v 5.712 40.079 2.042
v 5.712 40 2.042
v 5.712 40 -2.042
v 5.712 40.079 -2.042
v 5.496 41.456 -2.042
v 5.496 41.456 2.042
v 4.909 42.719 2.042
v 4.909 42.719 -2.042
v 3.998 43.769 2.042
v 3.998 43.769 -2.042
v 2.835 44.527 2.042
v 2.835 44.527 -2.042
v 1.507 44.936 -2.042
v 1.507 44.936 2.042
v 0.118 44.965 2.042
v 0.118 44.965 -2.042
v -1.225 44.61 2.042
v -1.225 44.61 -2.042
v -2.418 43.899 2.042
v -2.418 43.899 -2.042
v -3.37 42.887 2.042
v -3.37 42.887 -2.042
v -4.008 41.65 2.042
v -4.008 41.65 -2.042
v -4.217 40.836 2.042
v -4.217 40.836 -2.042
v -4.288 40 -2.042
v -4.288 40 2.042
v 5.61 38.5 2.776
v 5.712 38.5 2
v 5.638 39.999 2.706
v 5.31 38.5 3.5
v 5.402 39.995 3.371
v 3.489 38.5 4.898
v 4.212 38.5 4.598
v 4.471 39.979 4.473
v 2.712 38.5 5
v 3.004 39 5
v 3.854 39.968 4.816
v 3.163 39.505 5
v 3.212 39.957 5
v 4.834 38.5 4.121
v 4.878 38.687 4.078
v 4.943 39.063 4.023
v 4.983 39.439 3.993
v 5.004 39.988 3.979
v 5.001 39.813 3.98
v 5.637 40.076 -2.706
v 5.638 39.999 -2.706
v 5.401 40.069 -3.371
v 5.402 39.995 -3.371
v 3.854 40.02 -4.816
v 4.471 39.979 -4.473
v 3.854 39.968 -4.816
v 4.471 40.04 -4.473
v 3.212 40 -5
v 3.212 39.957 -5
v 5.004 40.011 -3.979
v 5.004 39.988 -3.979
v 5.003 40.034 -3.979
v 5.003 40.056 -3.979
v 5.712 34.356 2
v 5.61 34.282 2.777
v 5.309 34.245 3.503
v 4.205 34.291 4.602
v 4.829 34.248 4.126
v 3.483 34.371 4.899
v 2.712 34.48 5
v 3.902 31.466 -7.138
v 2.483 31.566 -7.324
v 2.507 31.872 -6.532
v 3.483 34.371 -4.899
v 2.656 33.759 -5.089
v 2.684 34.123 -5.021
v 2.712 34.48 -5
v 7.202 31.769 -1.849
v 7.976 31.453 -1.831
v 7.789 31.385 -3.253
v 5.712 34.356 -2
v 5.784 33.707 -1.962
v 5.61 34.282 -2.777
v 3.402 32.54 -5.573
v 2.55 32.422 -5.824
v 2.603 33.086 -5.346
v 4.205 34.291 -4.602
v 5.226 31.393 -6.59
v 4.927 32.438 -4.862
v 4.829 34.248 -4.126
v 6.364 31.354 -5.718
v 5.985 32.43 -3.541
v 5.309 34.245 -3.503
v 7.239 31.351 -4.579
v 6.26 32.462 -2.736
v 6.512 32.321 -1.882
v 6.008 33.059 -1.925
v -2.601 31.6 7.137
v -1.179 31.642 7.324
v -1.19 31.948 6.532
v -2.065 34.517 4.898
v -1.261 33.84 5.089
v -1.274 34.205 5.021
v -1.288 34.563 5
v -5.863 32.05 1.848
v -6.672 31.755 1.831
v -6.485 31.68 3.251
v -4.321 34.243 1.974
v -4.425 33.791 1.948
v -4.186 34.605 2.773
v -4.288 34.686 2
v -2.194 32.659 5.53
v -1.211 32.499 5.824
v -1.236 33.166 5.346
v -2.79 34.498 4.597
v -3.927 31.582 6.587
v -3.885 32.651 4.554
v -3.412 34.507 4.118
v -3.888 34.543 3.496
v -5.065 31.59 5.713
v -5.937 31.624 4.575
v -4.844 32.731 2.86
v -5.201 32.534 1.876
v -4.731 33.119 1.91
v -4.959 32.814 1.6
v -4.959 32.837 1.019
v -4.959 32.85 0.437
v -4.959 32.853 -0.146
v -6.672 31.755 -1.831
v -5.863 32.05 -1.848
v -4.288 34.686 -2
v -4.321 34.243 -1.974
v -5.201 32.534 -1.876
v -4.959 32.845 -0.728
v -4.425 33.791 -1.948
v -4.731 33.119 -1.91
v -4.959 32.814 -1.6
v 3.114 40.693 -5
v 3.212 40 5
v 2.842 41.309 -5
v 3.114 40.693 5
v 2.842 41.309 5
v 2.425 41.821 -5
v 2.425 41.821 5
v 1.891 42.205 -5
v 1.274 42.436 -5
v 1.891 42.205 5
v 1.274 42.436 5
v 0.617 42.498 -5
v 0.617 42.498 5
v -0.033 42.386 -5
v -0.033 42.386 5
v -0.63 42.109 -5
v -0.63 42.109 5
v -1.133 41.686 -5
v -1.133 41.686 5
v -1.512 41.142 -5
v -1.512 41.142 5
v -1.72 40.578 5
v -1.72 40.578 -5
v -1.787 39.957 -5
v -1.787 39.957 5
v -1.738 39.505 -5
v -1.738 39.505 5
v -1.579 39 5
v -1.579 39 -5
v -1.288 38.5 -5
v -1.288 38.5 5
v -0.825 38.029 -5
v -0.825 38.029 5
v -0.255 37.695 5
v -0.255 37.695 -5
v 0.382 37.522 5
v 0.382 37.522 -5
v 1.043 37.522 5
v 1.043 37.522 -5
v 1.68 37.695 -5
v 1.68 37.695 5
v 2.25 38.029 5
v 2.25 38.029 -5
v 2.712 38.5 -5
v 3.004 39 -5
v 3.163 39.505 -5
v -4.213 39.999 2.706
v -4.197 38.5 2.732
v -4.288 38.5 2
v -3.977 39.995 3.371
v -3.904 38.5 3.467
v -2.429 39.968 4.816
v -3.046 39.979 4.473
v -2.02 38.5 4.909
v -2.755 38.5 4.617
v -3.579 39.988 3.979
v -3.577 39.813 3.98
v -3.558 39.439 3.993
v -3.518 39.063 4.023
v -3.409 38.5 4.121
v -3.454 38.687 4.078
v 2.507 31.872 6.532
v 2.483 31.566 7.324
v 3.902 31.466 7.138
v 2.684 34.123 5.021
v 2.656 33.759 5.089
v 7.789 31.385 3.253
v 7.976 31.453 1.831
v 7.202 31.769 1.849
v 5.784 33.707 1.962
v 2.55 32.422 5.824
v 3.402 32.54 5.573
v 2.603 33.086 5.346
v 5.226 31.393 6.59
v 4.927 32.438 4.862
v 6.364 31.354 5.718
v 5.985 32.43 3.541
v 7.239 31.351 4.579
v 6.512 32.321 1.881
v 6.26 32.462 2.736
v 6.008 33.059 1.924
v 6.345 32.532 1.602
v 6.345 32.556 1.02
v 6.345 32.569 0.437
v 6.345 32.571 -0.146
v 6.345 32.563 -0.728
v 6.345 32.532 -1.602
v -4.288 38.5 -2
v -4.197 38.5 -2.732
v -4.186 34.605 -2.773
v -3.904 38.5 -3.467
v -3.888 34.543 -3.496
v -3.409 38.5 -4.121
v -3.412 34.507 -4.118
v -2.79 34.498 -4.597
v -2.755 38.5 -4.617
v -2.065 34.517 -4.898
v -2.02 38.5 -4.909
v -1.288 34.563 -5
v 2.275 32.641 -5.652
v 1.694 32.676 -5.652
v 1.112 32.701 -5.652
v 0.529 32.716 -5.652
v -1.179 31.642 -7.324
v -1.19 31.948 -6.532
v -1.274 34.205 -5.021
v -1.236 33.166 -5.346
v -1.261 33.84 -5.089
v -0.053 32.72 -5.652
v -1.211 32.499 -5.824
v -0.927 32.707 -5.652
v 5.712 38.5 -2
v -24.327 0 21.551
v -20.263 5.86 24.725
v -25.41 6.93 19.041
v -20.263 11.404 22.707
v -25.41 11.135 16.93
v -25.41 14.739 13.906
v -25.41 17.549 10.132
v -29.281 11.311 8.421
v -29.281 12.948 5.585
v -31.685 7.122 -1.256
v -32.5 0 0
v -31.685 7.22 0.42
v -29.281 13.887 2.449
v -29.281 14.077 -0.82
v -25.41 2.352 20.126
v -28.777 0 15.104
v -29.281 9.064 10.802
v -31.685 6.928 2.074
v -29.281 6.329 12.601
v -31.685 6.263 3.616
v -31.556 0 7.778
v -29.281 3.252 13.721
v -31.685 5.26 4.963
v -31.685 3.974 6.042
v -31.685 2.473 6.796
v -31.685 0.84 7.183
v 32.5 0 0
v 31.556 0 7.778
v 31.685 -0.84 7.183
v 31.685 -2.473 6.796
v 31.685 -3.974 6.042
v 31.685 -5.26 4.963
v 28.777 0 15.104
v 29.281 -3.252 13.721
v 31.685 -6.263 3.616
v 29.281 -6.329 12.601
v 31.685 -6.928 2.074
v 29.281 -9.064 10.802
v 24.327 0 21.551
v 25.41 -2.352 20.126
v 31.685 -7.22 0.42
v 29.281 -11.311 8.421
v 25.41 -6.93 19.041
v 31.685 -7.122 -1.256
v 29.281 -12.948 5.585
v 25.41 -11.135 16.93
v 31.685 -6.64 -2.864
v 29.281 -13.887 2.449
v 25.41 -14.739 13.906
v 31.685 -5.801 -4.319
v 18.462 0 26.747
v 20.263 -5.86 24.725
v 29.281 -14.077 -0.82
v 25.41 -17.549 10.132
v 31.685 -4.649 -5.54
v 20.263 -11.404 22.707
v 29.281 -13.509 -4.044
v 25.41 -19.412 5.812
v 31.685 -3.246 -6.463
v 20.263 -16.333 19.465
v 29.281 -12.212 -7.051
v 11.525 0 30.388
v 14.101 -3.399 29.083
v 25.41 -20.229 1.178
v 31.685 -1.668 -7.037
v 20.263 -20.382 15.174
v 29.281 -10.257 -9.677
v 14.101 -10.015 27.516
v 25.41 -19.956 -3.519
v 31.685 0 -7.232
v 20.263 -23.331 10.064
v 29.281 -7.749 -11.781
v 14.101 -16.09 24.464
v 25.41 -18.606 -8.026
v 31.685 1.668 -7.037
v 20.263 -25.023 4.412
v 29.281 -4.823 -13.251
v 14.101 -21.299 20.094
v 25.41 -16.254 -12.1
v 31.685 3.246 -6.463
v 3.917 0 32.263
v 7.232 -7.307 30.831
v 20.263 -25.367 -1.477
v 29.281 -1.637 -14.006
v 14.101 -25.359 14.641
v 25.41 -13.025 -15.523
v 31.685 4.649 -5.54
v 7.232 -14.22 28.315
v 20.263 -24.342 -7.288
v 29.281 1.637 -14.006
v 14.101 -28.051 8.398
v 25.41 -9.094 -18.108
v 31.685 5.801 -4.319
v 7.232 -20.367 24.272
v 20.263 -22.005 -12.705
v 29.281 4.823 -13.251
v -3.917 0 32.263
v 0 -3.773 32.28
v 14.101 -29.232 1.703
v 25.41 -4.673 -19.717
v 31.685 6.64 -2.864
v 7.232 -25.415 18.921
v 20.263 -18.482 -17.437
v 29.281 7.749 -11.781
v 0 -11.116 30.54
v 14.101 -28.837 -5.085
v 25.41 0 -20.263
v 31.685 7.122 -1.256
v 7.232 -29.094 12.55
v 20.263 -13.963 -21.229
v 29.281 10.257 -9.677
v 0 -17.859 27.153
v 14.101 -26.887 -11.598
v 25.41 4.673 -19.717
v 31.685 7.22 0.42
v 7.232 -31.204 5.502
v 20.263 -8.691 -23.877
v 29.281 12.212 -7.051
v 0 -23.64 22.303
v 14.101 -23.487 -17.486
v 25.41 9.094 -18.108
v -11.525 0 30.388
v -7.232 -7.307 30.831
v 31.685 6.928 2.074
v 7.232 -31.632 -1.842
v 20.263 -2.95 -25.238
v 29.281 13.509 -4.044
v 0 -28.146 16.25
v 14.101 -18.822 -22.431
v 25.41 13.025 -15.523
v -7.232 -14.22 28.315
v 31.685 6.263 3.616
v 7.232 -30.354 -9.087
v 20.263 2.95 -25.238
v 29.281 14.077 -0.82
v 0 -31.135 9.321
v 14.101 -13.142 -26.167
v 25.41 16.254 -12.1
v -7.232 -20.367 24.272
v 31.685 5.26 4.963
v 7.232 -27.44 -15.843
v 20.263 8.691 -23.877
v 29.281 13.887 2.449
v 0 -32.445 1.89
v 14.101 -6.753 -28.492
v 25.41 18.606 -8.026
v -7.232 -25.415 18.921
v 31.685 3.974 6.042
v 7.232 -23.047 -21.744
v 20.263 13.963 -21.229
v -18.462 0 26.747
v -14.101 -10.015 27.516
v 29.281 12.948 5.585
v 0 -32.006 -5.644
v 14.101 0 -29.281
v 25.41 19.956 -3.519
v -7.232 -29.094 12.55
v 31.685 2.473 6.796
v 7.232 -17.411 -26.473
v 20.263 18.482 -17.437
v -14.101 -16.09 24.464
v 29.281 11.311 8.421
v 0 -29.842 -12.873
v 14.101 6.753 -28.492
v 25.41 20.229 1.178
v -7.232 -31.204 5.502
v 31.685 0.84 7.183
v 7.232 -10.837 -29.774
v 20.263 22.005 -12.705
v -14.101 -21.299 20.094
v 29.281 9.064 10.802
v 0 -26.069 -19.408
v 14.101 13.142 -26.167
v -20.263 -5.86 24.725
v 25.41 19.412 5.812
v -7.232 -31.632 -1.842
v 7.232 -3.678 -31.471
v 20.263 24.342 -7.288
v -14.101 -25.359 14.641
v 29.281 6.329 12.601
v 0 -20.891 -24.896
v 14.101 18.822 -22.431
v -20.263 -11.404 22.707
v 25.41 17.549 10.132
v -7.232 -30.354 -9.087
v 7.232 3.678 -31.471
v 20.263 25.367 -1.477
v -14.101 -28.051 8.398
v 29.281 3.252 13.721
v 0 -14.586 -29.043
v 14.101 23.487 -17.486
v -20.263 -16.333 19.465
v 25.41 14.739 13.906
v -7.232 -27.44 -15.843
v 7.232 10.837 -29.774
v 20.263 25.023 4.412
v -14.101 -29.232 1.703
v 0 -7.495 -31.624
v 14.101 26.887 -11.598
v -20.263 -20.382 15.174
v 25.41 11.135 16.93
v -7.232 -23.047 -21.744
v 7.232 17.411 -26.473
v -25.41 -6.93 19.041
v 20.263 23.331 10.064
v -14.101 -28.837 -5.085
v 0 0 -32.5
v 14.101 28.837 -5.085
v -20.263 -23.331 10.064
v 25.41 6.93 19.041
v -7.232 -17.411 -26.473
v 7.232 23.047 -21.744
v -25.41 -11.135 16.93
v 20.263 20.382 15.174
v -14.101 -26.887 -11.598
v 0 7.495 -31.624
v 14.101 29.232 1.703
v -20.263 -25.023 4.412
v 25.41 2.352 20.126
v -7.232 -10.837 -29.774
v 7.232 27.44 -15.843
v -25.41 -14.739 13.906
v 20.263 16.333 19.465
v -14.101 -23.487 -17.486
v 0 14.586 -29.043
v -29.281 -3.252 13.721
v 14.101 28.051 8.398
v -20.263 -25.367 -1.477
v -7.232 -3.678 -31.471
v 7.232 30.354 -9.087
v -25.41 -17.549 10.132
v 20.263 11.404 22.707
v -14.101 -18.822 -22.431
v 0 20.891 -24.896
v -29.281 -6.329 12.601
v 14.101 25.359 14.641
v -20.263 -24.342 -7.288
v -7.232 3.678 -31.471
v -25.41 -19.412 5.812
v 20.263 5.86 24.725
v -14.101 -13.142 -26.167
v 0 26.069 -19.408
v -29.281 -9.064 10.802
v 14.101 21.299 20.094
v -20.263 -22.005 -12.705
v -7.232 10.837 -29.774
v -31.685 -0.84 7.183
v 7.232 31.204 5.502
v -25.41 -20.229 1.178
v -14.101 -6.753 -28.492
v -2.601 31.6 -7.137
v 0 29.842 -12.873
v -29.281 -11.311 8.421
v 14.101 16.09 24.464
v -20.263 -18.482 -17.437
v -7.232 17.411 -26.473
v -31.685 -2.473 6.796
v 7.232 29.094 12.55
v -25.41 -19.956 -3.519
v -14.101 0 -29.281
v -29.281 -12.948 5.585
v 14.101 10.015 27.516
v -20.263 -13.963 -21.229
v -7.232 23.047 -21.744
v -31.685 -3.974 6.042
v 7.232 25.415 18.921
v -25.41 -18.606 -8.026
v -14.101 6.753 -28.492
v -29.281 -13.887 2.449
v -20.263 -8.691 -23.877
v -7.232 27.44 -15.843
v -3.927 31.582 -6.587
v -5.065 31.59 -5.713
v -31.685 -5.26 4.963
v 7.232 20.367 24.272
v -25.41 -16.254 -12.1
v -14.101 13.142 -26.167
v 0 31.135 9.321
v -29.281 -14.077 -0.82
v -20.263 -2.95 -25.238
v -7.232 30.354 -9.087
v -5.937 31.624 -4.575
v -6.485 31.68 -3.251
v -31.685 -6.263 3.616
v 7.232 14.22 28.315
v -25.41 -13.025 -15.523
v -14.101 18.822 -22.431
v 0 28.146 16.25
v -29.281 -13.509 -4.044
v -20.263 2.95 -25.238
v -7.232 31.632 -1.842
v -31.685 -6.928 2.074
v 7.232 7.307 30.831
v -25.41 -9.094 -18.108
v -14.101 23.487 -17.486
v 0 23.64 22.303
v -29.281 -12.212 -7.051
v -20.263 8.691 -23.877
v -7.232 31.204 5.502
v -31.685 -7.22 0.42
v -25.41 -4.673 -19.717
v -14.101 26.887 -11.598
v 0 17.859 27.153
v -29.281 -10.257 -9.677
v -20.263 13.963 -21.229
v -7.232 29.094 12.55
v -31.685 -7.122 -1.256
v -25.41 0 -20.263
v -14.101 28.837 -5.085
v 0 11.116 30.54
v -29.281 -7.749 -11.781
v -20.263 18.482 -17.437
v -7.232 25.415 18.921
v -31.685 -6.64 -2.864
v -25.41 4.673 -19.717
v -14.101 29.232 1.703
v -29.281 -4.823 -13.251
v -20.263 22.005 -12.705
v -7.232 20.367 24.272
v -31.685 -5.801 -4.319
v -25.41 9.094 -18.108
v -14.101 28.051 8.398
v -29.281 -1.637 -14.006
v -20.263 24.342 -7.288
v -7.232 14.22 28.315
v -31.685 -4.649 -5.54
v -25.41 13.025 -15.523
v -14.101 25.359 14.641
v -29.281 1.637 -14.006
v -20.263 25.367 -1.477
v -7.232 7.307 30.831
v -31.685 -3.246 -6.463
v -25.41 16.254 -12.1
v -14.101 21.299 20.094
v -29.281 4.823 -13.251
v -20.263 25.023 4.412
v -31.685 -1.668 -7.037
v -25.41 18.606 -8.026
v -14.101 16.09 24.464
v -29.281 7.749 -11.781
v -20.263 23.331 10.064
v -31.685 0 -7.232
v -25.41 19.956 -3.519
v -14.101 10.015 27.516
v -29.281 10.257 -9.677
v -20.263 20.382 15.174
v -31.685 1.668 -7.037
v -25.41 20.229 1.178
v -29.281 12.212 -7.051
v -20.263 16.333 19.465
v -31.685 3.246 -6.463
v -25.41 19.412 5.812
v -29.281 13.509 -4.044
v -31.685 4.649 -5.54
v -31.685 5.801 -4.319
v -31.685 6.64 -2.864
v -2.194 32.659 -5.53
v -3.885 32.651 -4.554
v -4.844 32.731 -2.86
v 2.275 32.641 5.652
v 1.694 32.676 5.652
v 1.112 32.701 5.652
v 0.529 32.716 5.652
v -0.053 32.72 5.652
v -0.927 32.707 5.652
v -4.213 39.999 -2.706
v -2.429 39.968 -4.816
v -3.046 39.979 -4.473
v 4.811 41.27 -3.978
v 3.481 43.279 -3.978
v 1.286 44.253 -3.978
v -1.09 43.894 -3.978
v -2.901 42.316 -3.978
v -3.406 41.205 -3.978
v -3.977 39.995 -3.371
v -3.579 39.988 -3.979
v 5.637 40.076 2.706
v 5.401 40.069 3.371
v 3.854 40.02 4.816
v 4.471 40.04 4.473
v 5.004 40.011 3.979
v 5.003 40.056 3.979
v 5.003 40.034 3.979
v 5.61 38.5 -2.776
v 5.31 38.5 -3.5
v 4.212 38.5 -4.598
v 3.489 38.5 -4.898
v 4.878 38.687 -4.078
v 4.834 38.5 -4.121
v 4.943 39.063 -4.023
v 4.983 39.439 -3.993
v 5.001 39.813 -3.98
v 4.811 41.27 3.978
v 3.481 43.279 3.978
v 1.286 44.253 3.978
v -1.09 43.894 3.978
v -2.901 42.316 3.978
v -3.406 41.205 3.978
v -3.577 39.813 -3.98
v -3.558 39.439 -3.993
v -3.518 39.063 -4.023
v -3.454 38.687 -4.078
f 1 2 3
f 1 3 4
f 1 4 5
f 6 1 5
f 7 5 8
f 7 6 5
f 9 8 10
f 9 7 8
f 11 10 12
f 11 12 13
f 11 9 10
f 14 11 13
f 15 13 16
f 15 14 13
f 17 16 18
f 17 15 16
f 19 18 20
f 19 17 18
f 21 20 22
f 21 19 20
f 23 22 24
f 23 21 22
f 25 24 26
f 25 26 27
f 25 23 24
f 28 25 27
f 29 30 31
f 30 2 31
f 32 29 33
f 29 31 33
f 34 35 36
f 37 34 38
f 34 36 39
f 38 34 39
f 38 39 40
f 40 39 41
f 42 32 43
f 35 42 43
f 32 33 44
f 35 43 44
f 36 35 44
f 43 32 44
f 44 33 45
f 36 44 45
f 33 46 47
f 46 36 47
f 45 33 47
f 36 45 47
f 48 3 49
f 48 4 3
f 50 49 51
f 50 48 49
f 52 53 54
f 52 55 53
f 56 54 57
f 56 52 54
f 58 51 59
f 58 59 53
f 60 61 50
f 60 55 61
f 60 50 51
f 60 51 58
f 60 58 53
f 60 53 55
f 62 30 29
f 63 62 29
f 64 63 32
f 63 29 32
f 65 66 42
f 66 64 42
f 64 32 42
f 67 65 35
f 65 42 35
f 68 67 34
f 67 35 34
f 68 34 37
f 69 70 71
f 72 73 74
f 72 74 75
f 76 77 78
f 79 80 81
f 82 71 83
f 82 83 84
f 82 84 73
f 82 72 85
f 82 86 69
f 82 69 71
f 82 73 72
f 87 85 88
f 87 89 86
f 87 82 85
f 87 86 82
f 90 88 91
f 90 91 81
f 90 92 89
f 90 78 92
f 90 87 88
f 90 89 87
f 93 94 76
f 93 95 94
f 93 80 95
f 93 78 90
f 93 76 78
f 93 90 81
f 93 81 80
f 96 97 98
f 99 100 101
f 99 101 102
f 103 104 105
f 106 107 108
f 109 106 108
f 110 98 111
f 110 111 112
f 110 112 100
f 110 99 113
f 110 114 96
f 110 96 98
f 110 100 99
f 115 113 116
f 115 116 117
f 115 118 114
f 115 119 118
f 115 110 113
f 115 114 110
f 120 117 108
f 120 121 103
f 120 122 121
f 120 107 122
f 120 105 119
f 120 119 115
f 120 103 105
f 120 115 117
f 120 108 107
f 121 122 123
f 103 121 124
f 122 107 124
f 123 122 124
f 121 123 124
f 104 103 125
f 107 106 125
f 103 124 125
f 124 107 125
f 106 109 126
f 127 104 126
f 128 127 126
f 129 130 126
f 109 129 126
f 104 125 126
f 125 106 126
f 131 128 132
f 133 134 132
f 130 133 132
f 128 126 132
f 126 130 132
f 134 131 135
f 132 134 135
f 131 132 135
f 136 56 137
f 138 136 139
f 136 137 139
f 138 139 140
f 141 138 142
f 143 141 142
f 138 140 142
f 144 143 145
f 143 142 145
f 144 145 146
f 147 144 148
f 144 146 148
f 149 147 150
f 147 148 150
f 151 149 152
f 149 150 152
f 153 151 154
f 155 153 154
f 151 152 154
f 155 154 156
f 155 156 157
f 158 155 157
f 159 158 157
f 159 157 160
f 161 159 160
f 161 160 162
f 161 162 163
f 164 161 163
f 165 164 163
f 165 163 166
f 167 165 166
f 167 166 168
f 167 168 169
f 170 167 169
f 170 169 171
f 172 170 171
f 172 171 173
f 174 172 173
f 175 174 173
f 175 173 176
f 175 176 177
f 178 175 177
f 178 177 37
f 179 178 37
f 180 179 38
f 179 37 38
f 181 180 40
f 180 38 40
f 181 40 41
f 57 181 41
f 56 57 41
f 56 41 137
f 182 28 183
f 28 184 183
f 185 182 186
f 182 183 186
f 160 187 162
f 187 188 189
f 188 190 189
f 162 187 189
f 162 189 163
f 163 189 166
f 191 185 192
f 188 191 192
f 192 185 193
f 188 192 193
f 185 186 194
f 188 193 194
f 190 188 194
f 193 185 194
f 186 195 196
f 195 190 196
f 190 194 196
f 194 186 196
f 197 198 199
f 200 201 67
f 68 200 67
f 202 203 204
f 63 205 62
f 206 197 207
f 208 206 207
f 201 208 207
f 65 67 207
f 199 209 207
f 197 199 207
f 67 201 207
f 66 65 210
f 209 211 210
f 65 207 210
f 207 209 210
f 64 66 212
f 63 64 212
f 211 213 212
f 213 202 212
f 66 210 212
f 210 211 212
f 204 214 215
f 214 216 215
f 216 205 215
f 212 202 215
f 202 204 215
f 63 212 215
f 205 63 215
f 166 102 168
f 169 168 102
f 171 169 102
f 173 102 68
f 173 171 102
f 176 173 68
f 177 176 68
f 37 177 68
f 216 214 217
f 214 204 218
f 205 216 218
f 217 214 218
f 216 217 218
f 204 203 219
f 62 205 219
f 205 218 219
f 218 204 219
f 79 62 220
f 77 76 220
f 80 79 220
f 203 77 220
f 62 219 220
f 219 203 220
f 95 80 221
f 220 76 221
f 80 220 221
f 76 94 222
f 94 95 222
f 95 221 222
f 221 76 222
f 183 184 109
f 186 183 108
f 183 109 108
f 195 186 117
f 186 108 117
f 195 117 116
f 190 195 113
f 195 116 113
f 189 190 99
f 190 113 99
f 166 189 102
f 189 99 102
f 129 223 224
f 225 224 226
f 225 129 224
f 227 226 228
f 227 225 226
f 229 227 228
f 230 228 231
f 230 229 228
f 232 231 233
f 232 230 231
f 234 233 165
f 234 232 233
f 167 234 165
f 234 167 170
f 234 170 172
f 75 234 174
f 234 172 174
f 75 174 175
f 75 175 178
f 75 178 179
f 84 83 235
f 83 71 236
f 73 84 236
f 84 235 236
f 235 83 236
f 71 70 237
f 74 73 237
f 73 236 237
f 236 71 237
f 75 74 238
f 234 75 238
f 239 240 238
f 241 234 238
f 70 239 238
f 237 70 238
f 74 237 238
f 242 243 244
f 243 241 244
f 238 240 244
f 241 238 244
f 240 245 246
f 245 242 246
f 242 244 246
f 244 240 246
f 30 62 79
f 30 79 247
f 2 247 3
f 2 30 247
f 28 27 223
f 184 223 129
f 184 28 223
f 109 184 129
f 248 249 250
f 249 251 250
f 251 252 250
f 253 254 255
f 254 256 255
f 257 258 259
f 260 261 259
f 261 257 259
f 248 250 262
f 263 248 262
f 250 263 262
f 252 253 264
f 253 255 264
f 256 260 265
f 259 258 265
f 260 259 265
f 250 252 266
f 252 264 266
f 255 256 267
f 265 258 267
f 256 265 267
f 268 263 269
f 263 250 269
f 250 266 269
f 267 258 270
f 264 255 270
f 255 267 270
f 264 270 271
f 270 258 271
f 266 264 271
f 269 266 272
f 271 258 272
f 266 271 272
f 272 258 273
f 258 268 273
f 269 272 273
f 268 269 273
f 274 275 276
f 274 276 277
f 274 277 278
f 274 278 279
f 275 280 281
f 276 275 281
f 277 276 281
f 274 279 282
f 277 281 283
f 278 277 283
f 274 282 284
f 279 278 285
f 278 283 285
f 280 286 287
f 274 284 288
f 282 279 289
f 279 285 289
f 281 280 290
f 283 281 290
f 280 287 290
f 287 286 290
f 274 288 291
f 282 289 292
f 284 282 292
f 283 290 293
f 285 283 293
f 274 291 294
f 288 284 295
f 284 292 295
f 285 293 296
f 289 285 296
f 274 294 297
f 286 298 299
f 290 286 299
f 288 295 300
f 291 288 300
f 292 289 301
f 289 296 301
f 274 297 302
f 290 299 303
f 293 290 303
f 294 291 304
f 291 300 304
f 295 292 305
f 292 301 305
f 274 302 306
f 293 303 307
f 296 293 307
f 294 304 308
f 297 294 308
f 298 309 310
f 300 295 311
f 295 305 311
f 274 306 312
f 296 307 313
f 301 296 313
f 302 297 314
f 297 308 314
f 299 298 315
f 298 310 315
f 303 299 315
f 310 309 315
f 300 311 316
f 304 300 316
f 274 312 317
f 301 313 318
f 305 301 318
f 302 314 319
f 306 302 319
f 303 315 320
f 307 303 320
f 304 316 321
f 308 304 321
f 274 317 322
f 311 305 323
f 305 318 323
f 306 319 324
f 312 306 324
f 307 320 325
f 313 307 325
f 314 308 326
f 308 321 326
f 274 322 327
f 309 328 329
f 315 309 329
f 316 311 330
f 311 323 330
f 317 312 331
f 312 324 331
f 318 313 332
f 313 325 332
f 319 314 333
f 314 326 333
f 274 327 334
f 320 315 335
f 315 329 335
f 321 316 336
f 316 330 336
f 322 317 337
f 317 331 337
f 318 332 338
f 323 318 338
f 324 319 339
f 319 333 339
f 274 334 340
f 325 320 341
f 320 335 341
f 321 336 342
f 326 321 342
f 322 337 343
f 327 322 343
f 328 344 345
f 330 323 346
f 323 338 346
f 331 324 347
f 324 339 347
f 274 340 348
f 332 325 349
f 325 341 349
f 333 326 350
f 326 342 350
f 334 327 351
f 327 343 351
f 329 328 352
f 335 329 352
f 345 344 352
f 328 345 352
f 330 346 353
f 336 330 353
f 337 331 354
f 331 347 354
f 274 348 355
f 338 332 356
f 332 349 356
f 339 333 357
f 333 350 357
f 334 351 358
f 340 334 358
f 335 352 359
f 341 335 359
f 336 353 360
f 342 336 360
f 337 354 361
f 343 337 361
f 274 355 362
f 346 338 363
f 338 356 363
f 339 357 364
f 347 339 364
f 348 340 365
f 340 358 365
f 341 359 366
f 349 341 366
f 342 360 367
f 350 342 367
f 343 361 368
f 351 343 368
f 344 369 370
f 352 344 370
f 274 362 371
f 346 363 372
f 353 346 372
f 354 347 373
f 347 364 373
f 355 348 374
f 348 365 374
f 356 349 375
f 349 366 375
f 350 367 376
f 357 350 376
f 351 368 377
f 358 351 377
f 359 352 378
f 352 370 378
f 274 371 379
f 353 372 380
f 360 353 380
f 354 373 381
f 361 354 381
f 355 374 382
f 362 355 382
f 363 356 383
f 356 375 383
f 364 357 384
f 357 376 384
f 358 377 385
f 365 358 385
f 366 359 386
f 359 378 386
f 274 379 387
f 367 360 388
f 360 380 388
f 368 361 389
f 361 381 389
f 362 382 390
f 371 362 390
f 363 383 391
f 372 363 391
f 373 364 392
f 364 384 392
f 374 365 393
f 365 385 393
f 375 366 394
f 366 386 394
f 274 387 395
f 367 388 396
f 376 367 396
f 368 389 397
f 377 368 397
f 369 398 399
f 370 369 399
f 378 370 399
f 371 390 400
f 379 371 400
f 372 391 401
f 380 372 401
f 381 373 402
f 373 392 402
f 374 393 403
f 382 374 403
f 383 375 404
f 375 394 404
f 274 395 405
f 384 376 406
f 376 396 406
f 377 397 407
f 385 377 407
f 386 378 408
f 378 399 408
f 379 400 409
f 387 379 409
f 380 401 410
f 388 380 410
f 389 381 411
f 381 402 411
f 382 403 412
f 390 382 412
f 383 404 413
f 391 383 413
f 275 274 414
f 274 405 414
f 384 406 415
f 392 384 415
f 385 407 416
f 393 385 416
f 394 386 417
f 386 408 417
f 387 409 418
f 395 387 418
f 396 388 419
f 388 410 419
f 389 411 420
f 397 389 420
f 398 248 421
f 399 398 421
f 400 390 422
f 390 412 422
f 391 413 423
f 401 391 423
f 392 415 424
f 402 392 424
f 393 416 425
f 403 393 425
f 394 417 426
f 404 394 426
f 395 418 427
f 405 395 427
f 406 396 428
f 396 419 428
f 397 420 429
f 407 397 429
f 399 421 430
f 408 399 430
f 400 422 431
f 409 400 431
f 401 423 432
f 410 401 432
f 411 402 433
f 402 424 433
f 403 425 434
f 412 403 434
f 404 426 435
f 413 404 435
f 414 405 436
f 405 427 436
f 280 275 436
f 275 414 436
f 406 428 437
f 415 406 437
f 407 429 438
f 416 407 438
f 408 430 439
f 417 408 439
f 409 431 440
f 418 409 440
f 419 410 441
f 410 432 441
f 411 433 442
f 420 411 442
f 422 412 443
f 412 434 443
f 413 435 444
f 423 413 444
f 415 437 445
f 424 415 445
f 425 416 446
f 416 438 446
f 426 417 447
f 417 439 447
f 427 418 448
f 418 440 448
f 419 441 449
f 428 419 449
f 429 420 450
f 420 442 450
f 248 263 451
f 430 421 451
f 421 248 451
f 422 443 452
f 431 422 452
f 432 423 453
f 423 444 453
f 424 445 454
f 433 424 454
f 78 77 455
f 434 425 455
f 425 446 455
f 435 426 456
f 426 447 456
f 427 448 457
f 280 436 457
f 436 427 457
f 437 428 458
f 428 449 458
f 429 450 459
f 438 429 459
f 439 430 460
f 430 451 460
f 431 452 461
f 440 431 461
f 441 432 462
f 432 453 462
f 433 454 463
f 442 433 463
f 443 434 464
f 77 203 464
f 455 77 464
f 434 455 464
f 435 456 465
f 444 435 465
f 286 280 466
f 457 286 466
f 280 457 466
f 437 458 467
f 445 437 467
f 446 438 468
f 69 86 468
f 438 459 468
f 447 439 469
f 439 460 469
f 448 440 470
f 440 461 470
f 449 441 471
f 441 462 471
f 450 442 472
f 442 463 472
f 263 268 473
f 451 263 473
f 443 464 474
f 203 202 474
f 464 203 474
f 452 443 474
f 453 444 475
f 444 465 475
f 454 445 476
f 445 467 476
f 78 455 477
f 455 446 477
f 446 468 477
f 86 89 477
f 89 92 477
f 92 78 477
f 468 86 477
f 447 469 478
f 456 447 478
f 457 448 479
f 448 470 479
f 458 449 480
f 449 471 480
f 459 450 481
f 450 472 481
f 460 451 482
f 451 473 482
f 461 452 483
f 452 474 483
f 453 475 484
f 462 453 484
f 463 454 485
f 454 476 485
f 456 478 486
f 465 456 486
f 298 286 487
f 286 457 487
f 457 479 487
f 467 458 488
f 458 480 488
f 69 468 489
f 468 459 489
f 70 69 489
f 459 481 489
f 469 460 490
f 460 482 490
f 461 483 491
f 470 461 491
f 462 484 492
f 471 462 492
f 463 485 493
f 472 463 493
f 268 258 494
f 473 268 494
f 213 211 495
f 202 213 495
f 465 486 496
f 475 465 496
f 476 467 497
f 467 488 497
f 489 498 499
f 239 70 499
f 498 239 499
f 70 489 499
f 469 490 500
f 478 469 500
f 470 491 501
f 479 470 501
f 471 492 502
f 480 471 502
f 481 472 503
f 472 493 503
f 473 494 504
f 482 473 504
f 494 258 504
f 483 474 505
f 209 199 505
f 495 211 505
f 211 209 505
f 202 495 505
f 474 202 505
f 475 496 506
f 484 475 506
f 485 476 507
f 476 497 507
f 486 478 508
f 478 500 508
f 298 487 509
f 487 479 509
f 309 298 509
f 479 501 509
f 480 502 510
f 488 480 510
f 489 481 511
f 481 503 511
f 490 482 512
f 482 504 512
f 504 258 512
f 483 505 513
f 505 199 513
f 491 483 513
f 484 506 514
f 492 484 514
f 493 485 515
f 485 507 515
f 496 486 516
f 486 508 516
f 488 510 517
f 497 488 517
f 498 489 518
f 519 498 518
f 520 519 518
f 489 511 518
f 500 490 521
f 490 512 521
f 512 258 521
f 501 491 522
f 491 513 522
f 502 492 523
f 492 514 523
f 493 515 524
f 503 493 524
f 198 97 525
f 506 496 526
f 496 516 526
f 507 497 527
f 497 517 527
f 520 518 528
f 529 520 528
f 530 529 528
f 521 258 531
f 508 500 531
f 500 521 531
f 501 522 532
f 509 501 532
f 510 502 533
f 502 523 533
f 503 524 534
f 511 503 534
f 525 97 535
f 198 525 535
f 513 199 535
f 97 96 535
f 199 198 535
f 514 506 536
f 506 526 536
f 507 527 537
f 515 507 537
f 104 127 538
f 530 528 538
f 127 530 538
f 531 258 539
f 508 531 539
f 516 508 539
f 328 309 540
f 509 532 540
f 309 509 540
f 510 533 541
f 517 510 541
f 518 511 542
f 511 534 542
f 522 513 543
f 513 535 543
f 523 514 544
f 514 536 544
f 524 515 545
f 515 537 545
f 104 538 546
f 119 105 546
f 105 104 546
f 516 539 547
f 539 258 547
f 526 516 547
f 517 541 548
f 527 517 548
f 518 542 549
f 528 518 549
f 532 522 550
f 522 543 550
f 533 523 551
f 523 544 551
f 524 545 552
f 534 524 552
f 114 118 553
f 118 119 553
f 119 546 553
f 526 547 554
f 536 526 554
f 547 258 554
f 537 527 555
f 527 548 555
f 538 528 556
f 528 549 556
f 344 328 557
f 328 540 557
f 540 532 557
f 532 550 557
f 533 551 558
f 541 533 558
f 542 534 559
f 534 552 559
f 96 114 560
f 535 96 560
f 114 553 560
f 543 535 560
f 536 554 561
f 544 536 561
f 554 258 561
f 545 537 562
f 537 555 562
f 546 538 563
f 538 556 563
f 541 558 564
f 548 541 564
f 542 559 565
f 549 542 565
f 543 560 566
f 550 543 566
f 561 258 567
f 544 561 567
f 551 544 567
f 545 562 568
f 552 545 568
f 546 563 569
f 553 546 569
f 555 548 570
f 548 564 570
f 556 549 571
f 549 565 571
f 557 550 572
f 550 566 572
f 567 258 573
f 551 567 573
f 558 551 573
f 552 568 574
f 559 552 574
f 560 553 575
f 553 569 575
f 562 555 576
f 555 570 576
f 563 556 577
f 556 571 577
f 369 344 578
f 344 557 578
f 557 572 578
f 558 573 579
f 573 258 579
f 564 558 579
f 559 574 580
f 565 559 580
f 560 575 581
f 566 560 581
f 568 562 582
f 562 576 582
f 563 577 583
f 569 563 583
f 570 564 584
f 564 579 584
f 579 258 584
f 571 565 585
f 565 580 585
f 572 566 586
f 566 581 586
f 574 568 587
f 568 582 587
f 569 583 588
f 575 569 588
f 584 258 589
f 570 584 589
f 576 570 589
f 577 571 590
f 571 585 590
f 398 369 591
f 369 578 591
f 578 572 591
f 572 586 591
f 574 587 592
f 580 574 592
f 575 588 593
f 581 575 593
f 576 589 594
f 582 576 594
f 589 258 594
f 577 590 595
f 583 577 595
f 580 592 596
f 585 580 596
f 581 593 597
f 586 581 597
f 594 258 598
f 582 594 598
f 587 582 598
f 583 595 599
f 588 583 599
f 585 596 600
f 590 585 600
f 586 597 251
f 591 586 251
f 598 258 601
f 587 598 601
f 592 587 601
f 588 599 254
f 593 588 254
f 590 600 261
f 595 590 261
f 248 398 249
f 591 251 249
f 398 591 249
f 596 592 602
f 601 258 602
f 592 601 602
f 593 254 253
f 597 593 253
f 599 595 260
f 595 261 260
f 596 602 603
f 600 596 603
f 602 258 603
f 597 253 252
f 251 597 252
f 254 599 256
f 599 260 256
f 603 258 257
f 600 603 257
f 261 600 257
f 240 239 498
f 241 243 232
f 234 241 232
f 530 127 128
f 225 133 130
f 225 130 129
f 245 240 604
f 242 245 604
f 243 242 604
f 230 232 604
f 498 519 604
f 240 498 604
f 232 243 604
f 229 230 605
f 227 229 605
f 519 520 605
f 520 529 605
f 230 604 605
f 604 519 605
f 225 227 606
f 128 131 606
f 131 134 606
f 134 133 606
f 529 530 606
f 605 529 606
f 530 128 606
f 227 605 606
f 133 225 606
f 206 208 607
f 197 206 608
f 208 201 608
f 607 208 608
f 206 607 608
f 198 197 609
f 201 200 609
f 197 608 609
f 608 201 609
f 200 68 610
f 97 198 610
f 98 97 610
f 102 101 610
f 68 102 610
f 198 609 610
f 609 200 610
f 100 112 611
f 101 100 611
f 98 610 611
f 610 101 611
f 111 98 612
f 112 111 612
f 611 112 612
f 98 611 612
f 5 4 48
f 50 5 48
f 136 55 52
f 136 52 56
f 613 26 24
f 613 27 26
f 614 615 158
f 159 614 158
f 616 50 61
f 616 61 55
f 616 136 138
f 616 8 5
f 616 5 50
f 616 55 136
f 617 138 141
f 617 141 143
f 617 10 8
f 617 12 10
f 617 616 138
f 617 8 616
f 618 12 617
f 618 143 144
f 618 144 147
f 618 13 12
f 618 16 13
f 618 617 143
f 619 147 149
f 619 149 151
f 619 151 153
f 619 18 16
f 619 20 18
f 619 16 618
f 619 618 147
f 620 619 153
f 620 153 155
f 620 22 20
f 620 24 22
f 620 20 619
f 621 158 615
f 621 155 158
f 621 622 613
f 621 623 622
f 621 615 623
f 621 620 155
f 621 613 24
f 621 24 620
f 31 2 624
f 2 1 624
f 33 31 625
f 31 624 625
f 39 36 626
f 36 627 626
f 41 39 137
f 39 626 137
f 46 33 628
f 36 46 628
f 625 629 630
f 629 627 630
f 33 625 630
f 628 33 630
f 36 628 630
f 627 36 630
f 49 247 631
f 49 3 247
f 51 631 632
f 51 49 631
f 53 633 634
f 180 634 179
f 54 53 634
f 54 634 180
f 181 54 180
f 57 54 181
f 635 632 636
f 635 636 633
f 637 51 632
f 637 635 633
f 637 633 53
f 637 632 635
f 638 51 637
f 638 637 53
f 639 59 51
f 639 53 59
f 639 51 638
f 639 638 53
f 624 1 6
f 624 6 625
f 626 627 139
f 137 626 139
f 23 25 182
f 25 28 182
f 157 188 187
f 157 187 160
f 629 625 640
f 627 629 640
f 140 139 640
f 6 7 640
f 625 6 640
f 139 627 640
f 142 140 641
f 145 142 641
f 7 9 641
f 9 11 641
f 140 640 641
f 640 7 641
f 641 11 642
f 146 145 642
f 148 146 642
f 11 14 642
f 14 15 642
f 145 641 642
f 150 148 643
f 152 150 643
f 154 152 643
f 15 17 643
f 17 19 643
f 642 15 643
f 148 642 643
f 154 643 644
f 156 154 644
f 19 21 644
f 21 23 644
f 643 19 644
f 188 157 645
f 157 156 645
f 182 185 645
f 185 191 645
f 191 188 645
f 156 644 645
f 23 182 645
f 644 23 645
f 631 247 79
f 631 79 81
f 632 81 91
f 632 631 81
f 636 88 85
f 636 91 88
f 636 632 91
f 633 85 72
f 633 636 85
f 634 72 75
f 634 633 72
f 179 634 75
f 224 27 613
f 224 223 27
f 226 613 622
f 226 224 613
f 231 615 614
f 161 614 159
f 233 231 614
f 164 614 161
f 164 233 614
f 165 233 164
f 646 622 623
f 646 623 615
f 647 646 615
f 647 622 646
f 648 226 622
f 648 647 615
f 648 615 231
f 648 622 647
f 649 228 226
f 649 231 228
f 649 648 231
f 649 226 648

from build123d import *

# Parameters (mm, degrees)
BOSS_EXTRUDE1_DEPTH = 5
SKETCH3_R           = 2.5
CUT_EXTRUDE1_DEPTH  = 10
FILLET7_R           = 3


with BuildPart() as part:
    # Sketch1 → Revolve1 (revolve)
    with BuildSketch(Plane(origin=(0, 0, 0), x_dir=(1, 0, 0), z_dir=(0, 1, 0))):
        with BuildLine():
            Line((-32.5, 0), (32.5, 0))
            ThreePointArc((32.5, 0), (0, -32.5), (-32.5, 0))
        make_face()
    revolve(axis=Axis((-32.5, 0, 0), (1, 0, 0)))

    # Sketch2 → Boss-Extrude1 (add, symmetric)
    with BuildSketch(Plane.XY):
        with BuildLine():
            Line((-4.287633392, 40), (-4.287633392, 25))
            Line((-4.287633392, 25), (5.712366608, 25))
            Line((5.712366608, 25), (5.712366608, 40))
            ThreePointArc((5.712366608, 40), (0.712366608, 45), (-4.287633392, 40))
        make_face()
    extrude(amount=BOSS_EXTRUDE1_DEPTH, both=True)

    # Sketch3 → Cut-Extrude1 (cut)
    with BuildSketch(Plane.XY.offset(5)):
        with Locations((0.712366608, 40)):
            Circle(SKETCH3_R)
    extrude(amount=-CUT_EXTRUDE1_DEPTH, mode=Mode.SUBTRACT)

    # Fillet7
    fillet7_edges = [part.edges().sort_by_distance(p)[0] for p in [
        (-4.287633392, 32.21593084, 0),
        (5.712366608, 31.994044254, 0),
        (-4.287633392, 35.912779455, -5),
        (5.712366608, 35.800465719, -5),
        (-4.287633392, 35.912779455, 5),
        (5.712366608, 35.800465719, 5),
        (0.72116611, 32.104982782, -5),
        (0.72116611, 32.104982782, 5),
    ]]
    fillet(fillet7_edges, radius=FILLET7_R)


solid = part.part
